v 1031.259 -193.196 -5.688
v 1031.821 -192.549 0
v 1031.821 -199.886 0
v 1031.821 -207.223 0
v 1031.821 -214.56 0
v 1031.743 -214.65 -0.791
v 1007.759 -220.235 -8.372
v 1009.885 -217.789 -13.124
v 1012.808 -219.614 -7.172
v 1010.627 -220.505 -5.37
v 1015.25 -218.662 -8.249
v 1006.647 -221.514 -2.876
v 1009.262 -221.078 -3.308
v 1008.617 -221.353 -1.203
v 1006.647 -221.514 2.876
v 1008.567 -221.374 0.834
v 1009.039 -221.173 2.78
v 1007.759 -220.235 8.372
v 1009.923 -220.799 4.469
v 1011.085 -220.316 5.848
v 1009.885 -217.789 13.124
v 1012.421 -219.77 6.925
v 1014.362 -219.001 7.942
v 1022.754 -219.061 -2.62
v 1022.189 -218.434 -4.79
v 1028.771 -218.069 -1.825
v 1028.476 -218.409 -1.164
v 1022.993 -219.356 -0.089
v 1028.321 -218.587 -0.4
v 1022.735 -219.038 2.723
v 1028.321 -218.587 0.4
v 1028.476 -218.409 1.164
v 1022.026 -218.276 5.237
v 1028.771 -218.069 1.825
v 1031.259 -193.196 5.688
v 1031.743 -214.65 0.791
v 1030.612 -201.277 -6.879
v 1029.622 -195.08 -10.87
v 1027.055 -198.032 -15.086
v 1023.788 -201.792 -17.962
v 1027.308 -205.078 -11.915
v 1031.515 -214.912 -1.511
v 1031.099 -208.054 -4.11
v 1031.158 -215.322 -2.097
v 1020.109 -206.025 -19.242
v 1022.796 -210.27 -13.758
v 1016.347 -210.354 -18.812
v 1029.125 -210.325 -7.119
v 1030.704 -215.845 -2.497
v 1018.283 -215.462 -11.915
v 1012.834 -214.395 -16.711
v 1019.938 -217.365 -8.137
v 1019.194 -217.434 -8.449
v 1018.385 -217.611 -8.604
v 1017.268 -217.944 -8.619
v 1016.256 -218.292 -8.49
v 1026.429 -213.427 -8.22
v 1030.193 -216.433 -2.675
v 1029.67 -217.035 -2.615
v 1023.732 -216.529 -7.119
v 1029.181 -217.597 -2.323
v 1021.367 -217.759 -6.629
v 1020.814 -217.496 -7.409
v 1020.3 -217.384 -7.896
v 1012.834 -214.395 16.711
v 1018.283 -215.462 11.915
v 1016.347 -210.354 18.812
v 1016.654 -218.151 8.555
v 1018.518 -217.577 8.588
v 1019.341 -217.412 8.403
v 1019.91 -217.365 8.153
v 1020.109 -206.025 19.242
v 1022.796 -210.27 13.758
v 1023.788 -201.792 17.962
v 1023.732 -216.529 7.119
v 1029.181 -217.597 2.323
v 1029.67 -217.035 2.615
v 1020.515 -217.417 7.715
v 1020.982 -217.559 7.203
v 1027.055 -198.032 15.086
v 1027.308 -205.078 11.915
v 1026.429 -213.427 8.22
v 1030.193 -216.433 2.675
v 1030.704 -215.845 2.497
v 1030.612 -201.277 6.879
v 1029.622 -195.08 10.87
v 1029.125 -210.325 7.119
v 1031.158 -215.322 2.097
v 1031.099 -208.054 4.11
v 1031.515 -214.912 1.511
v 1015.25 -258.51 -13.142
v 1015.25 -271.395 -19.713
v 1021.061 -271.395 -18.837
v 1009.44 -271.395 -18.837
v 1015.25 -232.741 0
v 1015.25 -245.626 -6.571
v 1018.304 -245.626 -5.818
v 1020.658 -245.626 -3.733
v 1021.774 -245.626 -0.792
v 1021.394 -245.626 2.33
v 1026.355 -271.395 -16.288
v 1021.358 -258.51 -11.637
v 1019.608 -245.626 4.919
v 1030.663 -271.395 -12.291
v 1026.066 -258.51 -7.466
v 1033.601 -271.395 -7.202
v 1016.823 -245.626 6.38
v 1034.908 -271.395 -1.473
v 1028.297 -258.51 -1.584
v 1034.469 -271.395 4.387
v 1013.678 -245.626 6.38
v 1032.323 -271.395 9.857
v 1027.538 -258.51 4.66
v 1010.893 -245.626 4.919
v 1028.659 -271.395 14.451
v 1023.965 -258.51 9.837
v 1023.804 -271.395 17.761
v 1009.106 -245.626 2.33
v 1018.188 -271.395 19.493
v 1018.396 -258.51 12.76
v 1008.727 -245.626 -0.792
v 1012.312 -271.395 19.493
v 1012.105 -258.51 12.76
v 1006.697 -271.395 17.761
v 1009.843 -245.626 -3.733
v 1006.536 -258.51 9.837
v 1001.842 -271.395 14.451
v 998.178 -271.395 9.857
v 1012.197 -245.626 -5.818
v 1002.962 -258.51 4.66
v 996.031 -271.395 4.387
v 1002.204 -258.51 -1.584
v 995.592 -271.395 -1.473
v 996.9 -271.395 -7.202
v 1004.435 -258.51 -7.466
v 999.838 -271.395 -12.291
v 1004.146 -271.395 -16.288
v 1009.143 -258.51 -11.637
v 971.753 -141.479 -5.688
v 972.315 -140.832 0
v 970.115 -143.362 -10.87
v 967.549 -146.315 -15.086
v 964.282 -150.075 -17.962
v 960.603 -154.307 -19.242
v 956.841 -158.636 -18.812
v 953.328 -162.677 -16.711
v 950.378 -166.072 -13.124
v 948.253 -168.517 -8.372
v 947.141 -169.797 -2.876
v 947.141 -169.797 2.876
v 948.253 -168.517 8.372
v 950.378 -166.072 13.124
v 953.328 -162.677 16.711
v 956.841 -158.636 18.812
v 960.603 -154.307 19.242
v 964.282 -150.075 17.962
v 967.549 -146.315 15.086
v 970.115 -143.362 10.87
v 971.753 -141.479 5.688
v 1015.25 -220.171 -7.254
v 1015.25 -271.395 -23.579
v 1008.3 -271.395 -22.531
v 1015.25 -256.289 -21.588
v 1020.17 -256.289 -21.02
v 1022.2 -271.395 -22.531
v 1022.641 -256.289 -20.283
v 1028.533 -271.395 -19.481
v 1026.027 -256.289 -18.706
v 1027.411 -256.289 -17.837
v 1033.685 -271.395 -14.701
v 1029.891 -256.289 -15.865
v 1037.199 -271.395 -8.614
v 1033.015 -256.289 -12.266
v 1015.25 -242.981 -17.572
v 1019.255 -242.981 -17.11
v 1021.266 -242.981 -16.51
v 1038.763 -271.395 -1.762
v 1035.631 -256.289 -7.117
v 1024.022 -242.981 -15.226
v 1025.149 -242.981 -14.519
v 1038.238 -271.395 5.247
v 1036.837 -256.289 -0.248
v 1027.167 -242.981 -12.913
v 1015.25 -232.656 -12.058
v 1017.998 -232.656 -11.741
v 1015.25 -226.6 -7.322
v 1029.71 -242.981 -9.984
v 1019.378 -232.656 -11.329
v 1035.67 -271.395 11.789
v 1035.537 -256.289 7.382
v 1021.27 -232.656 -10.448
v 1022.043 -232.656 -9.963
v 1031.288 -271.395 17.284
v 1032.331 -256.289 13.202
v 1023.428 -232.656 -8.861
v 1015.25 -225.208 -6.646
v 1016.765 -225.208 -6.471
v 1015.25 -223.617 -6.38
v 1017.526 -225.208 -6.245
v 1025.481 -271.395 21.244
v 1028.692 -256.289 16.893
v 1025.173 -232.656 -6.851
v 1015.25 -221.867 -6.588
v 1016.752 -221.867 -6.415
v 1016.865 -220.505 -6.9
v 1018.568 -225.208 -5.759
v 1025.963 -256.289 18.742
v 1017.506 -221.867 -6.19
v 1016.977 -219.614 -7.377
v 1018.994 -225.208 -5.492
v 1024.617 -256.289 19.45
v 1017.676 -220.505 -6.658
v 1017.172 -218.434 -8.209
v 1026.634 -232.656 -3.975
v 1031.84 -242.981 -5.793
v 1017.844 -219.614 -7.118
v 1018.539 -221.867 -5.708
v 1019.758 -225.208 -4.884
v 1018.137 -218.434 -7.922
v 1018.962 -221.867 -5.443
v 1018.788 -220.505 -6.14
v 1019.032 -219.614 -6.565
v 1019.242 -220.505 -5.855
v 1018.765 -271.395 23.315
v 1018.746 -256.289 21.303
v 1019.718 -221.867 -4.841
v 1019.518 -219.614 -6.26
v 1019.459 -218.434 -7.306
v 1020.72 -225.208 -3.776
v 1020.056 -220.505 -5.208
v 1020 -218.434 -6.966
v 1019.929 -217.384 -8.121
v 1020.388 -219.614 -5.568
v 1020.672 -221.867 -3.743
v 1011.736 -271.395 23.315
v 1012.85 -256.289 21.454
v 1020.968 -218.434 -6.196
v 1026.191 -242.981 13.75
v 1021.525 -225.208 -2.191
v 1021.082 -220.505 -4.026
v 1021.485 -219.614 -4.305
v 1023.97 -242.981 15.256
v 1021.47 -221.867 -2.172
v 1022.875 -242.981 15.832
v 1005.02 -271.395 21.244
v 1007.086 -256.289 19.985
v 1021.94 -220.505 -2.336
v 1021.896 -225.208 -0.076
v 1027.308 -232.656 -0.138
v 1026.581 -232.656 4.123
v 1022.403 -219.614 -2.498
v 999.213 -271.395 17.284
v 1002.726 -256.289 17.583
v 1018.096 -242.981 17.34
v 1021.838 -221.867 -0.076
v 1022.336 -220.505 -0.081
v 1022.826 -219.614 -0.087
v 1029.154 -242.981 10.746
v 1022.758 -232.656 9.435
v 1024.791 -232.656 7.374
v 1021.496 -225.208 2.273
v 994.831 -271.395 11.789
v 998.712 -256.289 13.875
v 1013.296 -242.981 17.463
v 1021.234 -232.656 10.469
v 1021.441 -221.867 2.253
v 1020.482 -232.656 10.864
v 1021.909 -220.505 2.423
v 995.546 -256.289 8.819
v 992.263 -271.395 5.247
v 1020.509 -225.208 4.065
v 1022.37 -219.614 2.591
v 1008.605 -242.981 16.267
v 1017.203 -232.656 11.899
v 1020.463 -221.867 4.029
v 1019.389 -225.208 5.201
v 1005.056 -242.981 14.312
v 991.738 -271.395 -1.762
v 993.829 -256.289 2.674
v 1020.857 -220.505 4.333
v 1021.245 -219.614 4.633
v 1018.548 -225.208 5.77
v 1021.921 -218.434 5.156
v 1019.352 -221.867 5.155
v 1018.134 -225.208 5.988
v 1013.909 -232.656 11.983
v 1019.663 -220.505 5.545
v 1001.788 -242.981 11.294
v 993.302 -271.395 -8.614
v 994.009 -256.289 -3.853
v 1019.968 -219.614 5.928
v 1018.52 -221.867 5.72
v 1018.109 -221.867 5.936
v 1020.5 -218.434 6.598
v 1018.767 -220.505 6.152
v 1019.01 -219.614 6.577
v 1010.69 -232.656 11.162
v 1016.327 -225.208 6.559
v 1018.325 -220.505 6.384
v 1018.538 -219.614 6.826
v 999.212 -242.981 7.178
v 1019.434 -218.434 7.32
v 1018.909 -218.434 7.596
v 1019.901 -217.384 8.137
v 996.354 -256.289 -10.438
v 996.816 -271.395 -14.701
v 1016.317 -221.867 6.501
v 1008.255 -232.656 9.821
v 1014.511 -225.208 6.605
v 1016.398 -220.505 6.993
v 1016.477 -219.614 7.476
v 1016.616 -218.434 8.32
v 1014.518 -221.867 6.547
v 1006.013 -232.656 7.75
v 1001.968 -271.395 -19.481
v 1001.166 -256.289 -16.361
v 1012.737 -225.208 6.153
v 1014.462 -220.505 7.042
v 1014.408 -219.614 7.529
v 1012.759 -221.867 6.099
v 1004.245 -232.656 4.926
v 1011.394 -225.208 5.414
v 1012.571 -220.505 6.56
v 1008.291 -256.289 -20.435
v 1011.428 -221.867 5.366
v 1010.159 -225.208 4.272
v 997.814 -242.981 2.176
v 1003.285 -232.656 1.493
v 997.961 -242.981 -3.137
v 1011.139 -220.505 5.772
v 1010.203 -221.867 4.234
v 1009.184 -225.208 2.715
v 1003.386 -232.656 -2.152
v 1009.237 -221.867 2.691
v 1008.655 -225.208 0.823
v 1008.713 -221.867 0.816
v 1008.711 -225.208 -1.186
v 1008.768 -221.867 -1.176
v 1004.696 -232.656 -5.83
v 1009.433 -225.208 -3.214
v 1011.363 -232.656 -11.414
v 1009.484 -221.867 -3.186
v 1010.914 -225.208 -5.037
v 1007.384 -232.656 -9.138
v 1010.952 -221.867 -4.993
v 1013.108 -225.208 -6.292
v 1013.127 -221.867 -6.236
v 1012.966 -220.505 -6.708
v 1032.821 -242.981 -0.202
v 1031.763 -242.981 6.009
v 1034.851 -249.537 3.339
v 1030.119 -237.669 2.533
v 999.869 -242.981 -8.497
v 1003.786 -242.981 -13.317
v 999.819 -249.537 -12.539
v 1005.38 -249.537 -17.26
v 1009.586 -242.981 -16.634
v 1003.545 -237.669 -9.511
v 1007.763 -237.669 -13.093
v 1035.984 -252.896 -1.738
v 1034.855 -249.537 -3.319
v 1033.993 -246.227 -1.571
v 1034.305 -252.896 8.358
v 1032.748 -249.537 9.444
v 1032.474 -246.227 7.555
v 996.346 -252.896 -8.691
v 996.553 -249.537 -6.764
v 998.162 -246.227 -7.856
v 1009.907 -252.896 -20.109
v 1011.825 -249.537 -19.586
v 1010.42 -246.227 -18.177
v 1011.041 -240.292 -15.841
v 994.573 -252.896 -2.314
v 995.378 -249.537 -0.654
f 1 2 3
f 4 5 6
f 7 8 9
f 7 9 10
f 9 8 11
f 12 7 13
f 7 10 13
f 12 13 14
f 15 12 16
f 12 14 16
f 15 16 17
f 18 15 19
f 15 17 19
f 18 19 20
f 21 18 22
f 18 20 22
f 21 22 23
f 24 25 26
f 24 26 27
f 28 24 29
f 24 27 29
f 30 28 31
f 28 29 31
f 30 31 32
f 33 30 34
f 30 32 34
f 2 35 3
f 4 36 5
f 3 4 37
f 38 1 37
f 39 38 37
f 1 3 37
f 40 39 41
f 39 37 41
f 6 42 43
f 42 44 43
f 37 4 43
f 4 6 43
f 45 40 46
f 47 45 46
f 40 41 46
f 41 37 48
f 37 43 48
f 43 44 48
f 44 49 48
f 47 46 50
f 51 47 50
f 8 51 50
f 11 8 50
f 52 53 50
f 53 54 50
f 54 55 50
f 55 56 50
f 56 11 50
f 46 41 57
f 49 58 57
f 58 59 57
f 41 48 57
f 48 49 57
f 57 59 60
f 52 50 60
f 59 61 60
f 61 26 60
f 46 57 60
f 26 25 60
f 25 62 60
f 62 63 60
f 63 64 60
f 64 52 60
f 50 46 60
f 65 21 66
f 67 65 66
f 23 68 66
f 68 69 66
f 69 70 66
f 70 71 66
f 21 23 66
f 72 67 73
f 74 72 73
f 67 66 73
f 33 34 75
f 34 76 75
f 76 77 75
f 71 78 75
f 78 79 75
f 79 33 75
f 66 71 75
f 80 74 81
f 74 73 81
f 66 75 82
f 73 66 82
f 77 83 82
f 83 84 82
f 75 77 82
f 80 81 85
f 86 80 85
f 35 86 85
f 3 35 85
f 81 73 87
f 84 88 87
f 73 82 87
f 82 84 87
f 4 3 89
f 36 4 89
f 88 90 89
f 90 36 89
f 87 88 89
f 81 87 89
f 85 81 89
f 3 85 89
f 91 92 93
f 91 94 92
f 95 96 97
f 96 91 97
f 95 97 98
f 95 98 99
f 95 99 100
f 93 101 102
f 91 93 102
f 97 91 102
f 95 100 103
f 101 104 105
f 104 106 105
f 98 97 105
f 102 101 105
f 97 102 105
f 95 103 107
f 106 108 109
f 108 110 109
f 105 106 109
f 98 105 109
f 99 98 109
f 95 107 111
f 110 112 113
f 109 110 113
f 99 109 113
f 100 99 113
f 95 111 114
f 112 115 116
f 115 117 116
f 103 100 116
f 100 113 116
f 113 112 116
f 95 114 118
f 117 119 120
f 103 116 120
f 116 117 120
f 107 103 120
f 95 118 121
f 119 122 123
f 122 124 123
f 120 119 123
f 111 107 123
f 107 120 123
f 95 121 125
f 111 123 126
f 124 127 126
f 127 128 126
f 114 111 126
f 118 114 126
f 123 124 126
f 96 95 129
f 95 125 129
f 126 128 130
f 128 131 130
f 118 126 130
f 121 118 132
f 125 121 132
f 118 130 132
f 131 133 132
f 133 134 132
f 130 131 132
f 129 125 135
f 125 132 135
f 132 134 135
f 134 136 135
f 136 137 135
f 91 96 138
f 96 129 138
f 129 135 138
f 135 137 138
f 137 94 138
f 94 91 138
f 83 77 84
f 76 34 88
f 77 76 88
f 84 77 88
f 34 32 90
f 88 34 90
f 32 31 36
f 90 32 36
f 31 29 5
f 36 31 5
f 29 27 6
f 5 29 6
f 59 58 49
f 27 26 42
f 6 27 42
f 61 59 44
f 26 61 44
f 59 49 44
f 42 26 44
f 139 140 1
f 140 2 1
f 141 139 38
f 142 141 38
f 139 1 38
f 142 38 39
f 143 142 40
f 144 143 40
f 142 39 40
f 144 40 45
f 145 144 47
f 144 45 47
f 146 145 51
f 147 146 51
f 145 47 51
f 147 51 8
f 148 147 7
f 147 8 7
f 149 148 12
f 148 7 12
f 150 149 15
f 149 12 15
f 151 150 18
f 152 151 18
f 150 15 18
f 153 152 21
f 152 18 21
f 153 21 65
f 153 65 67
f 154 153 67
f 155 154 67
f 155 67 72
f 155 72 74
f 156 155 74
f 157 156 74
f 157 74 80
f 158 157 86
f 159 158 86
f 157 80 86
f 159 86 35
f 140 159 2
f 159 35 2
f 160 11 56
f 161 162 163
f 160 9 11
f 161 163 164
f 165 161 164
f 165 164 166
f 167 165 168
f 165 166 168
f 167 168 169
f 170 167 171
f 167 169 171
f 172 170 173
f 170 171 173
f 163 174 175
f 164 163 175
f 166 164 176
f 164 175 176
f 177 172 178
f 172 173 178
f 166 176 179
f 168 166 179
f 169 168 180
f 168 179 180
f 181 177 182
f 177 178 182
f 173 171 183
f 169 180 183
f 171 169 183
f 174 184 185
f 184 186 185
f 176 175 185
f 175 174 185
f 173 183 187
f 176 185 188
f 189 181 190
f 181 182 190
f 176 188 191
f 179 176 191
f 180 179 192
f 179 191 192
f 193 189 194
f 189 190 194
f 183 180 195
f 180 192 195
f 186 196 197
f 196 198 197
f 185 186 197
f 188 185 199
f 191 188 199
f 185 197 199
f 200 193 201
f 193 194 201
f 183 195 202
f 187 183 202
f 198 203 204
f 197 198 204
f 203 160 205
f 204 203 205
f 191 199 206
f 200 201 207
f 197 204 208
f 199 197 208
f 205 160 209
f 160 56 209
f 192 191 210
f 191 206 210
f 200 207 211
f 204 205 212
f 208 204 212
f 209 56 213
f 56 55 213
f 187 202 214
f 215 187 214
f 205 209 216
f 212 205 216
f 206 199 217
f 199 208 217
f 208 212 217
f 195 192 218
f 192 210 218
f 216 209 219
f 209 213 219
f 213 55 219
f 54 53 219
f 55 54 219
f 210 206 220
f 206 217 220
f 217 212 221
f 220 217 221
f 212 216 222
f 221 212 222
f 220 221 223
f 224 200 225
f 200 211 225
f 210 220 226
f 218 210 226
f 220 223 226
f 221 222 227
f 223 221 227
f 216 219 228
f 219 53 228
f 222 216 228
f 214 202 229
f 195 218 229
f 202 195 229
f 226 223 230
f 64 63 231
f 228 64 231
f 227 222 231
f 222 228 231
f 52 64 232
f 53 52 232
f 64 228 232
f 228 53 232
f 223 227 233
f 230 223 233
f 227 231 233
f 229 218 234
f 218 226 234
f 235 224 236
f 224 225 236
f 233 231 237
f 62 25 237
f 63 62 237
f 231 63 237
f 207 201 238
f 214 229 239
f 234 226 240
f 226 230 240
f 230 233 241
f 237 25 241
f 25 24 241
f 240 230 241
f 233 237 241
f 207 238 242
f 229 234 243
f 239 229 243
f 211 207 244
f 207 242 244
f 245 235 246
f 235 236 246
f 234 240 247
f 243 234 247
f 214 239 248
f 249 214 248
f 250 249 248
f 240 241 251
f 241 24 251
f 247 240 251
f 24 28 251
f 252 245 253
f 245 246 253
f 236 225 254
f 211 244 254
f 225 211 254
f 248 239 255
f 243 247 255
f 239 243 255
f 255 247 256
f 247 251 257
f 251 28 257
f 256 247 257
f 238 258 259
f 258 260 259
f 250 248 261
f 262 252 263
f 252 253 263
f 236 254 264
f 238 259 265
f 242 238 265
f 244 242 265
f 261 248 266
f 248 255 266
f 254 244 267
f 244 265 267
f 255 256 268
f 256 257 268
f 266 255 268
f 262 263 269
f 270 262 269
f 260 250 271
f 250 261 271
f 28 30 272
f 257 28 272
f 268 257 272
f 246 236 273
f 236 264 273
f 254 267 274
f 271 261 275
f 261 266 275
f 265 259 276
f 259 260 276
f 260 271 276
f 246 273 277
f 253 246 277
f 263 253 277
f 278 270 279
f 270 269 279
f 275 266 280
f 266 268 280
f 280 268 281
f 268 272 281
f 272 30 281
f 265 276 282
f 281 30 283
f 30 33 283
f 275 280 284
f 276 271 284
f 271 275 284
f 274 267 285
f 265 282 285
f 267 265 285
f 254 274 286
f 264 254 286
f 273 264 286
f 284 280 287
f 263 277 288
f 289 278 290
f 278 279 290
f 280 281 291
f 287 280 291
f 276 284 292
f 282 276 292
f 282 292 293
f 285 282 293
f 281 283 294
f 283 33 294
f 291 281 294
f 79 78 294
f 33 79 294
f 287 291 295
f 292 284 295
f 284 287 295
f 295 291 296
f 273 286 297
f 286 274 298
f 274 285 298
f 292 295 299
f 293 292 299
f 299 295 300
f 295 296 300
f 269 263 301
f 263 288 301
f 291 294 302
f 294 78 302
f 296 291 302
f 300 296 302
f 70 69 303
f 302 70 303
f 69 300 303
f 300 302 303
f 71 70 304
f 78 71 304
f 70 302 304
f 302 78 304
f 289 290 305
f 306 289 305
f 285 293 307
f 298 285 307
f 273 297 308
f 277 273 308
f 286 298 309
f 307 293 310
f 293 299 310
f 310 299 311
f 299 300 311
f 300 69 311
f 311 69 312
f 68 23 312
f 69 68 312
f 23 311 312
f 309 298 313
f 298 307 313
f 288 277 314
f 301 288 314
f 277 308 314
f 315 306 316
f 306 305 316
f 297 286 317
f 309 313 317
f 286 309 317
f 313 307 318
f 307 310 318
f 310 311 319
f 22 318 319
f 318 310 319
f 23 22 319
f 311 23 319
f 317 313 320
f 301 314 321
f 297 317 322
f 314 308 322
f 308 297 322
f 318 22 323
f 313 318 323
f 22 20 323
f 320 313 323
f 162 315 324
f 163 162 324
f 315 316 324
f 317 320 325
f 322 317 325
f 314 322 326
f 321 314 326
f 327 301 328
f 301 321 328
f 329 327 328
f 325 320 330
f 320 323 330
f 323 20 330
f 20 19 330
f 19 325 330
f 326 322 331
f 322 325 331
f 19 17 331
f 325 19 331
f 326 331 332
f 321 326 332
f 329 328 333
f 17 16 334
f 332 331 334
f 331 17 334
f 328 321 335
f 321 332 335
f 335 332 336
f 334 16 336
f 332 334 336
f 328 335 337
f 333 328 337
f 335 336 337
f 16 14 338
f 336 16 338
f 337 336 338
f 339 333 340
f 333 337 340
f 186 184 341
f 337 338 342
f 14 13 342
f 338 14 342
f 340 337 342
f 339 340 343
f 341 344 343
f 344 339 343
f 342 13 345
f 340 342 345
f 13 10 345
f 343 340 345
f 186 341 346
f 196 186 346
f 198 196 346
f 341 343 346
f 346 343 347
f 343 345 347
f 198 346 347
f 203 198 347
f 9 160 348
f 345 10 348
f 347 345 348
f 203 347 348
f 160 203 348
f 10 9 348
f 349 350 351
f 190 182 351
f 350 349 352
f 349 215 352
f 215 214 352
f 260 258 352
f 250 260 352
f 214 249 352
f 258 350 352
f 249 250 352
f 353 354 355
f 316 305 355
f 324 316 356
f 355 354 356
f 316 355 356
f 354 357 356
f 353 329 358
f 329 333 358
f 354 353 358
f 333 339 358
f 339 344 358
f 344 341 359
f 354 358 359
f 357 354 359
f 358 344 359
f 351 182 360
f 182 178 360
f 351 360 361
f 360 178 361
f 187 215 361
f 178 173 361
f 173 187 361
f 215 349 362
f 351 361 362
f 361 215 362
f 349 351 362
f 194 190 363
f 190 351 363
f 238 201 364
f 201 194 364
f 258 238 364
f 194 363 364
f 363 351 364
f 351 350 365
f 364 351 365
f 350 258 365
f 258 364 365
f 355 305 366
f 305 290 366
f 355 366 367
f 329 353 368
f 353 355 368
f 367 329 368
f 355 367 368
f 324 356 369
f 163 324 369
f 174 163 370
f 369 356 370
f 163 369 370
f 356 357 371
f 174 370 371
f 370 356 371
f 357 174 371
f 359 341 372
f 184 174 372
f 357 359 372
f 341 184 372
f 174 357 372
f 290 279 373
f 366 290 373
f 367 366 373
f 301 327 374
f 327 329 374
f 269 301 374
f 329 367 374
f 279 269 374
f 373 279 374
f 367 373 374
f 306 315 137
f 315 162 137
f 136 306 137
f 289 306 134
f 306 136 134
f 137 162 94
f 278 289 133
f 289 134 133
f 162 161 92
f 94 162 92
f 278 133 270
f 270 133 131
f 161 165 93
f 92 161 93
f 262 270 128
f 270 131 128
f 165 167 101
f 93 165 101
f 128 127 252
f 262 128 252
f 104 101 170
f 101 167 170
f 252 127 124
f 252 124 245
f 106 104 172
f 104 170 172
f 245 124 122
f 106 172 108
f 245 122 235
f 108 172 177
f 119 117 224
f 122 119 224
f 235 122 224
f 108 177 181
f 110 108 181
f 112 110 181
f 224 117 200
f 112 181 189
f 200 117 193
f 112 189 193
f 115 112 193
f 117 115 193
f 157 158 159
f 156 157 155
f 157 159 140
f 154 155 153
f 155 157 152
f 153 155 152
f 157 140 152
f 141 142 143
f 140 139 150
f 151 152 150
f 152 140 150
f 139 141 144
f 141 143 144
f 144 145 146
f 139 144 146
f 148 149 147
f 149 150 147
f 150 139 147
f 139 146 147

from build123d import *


with BuildPart() as part:
    # Sketch2 → Revolve1 (revolve)
    with BuildSketch(Plane.XY):
        Polygon((1030.061278696, -216.58443678), (959.657201148, -155.39542863), (972.314875011, -140.831508096), (1031.82096691, -192.548949314), (1031.82096691, -214.559739384), align=None)
    revolve(axis=Axis((1030.061278696, -216.58443678, 0), (-0.754774987, 0.655983779, 0)))

    # Sketch1 → Revolve2 (revolve)
    with BuildSketch(Plane.XY, mode=Mode.PRIVATE) as revolve2_sk:
        with BuildLine():
            Line((1034.963586572, -271.3945274), (1038.828918992, -271.3945274))
            add(Edge.make_bspline(
                [(1038.828918992, -271.3945274), (1037.873448174, -256.436961098), (1033.932423541, -239.028318184), (1022.04554778, -226.197270809), (1021.385558194, -223.249921116), (1023.46164644, -215.880421657), (1031.802541842, -213.509952537), (1030.500568899, -206.266042019)],
                knots=[0, 0, 0, 0, 0.648973555, 0.689713178, 0.725948802, 0.770741807, 1, 1, 1, 1], degree=3))
            Line((1030.500568899, -206.266042019), (1015.25039123, -206.266042019))
            Line((1015.25039123, -206.266042019), (1015.25039123, -232.741203199))
            Line((1015.25039123, -232.741203199), (1034.963586572, -271.3945274))
        make_face()
    revolve(revolve2_sk.sketch.rotate(Axis((1015.25039123, -199.885877629, 0), (0, -1, 0)), 270), axis=Axis((1015.25039123, -199.885877629, 0), (0, -1, 0)))  # turned: the seam where the file's is


solid = part.part
